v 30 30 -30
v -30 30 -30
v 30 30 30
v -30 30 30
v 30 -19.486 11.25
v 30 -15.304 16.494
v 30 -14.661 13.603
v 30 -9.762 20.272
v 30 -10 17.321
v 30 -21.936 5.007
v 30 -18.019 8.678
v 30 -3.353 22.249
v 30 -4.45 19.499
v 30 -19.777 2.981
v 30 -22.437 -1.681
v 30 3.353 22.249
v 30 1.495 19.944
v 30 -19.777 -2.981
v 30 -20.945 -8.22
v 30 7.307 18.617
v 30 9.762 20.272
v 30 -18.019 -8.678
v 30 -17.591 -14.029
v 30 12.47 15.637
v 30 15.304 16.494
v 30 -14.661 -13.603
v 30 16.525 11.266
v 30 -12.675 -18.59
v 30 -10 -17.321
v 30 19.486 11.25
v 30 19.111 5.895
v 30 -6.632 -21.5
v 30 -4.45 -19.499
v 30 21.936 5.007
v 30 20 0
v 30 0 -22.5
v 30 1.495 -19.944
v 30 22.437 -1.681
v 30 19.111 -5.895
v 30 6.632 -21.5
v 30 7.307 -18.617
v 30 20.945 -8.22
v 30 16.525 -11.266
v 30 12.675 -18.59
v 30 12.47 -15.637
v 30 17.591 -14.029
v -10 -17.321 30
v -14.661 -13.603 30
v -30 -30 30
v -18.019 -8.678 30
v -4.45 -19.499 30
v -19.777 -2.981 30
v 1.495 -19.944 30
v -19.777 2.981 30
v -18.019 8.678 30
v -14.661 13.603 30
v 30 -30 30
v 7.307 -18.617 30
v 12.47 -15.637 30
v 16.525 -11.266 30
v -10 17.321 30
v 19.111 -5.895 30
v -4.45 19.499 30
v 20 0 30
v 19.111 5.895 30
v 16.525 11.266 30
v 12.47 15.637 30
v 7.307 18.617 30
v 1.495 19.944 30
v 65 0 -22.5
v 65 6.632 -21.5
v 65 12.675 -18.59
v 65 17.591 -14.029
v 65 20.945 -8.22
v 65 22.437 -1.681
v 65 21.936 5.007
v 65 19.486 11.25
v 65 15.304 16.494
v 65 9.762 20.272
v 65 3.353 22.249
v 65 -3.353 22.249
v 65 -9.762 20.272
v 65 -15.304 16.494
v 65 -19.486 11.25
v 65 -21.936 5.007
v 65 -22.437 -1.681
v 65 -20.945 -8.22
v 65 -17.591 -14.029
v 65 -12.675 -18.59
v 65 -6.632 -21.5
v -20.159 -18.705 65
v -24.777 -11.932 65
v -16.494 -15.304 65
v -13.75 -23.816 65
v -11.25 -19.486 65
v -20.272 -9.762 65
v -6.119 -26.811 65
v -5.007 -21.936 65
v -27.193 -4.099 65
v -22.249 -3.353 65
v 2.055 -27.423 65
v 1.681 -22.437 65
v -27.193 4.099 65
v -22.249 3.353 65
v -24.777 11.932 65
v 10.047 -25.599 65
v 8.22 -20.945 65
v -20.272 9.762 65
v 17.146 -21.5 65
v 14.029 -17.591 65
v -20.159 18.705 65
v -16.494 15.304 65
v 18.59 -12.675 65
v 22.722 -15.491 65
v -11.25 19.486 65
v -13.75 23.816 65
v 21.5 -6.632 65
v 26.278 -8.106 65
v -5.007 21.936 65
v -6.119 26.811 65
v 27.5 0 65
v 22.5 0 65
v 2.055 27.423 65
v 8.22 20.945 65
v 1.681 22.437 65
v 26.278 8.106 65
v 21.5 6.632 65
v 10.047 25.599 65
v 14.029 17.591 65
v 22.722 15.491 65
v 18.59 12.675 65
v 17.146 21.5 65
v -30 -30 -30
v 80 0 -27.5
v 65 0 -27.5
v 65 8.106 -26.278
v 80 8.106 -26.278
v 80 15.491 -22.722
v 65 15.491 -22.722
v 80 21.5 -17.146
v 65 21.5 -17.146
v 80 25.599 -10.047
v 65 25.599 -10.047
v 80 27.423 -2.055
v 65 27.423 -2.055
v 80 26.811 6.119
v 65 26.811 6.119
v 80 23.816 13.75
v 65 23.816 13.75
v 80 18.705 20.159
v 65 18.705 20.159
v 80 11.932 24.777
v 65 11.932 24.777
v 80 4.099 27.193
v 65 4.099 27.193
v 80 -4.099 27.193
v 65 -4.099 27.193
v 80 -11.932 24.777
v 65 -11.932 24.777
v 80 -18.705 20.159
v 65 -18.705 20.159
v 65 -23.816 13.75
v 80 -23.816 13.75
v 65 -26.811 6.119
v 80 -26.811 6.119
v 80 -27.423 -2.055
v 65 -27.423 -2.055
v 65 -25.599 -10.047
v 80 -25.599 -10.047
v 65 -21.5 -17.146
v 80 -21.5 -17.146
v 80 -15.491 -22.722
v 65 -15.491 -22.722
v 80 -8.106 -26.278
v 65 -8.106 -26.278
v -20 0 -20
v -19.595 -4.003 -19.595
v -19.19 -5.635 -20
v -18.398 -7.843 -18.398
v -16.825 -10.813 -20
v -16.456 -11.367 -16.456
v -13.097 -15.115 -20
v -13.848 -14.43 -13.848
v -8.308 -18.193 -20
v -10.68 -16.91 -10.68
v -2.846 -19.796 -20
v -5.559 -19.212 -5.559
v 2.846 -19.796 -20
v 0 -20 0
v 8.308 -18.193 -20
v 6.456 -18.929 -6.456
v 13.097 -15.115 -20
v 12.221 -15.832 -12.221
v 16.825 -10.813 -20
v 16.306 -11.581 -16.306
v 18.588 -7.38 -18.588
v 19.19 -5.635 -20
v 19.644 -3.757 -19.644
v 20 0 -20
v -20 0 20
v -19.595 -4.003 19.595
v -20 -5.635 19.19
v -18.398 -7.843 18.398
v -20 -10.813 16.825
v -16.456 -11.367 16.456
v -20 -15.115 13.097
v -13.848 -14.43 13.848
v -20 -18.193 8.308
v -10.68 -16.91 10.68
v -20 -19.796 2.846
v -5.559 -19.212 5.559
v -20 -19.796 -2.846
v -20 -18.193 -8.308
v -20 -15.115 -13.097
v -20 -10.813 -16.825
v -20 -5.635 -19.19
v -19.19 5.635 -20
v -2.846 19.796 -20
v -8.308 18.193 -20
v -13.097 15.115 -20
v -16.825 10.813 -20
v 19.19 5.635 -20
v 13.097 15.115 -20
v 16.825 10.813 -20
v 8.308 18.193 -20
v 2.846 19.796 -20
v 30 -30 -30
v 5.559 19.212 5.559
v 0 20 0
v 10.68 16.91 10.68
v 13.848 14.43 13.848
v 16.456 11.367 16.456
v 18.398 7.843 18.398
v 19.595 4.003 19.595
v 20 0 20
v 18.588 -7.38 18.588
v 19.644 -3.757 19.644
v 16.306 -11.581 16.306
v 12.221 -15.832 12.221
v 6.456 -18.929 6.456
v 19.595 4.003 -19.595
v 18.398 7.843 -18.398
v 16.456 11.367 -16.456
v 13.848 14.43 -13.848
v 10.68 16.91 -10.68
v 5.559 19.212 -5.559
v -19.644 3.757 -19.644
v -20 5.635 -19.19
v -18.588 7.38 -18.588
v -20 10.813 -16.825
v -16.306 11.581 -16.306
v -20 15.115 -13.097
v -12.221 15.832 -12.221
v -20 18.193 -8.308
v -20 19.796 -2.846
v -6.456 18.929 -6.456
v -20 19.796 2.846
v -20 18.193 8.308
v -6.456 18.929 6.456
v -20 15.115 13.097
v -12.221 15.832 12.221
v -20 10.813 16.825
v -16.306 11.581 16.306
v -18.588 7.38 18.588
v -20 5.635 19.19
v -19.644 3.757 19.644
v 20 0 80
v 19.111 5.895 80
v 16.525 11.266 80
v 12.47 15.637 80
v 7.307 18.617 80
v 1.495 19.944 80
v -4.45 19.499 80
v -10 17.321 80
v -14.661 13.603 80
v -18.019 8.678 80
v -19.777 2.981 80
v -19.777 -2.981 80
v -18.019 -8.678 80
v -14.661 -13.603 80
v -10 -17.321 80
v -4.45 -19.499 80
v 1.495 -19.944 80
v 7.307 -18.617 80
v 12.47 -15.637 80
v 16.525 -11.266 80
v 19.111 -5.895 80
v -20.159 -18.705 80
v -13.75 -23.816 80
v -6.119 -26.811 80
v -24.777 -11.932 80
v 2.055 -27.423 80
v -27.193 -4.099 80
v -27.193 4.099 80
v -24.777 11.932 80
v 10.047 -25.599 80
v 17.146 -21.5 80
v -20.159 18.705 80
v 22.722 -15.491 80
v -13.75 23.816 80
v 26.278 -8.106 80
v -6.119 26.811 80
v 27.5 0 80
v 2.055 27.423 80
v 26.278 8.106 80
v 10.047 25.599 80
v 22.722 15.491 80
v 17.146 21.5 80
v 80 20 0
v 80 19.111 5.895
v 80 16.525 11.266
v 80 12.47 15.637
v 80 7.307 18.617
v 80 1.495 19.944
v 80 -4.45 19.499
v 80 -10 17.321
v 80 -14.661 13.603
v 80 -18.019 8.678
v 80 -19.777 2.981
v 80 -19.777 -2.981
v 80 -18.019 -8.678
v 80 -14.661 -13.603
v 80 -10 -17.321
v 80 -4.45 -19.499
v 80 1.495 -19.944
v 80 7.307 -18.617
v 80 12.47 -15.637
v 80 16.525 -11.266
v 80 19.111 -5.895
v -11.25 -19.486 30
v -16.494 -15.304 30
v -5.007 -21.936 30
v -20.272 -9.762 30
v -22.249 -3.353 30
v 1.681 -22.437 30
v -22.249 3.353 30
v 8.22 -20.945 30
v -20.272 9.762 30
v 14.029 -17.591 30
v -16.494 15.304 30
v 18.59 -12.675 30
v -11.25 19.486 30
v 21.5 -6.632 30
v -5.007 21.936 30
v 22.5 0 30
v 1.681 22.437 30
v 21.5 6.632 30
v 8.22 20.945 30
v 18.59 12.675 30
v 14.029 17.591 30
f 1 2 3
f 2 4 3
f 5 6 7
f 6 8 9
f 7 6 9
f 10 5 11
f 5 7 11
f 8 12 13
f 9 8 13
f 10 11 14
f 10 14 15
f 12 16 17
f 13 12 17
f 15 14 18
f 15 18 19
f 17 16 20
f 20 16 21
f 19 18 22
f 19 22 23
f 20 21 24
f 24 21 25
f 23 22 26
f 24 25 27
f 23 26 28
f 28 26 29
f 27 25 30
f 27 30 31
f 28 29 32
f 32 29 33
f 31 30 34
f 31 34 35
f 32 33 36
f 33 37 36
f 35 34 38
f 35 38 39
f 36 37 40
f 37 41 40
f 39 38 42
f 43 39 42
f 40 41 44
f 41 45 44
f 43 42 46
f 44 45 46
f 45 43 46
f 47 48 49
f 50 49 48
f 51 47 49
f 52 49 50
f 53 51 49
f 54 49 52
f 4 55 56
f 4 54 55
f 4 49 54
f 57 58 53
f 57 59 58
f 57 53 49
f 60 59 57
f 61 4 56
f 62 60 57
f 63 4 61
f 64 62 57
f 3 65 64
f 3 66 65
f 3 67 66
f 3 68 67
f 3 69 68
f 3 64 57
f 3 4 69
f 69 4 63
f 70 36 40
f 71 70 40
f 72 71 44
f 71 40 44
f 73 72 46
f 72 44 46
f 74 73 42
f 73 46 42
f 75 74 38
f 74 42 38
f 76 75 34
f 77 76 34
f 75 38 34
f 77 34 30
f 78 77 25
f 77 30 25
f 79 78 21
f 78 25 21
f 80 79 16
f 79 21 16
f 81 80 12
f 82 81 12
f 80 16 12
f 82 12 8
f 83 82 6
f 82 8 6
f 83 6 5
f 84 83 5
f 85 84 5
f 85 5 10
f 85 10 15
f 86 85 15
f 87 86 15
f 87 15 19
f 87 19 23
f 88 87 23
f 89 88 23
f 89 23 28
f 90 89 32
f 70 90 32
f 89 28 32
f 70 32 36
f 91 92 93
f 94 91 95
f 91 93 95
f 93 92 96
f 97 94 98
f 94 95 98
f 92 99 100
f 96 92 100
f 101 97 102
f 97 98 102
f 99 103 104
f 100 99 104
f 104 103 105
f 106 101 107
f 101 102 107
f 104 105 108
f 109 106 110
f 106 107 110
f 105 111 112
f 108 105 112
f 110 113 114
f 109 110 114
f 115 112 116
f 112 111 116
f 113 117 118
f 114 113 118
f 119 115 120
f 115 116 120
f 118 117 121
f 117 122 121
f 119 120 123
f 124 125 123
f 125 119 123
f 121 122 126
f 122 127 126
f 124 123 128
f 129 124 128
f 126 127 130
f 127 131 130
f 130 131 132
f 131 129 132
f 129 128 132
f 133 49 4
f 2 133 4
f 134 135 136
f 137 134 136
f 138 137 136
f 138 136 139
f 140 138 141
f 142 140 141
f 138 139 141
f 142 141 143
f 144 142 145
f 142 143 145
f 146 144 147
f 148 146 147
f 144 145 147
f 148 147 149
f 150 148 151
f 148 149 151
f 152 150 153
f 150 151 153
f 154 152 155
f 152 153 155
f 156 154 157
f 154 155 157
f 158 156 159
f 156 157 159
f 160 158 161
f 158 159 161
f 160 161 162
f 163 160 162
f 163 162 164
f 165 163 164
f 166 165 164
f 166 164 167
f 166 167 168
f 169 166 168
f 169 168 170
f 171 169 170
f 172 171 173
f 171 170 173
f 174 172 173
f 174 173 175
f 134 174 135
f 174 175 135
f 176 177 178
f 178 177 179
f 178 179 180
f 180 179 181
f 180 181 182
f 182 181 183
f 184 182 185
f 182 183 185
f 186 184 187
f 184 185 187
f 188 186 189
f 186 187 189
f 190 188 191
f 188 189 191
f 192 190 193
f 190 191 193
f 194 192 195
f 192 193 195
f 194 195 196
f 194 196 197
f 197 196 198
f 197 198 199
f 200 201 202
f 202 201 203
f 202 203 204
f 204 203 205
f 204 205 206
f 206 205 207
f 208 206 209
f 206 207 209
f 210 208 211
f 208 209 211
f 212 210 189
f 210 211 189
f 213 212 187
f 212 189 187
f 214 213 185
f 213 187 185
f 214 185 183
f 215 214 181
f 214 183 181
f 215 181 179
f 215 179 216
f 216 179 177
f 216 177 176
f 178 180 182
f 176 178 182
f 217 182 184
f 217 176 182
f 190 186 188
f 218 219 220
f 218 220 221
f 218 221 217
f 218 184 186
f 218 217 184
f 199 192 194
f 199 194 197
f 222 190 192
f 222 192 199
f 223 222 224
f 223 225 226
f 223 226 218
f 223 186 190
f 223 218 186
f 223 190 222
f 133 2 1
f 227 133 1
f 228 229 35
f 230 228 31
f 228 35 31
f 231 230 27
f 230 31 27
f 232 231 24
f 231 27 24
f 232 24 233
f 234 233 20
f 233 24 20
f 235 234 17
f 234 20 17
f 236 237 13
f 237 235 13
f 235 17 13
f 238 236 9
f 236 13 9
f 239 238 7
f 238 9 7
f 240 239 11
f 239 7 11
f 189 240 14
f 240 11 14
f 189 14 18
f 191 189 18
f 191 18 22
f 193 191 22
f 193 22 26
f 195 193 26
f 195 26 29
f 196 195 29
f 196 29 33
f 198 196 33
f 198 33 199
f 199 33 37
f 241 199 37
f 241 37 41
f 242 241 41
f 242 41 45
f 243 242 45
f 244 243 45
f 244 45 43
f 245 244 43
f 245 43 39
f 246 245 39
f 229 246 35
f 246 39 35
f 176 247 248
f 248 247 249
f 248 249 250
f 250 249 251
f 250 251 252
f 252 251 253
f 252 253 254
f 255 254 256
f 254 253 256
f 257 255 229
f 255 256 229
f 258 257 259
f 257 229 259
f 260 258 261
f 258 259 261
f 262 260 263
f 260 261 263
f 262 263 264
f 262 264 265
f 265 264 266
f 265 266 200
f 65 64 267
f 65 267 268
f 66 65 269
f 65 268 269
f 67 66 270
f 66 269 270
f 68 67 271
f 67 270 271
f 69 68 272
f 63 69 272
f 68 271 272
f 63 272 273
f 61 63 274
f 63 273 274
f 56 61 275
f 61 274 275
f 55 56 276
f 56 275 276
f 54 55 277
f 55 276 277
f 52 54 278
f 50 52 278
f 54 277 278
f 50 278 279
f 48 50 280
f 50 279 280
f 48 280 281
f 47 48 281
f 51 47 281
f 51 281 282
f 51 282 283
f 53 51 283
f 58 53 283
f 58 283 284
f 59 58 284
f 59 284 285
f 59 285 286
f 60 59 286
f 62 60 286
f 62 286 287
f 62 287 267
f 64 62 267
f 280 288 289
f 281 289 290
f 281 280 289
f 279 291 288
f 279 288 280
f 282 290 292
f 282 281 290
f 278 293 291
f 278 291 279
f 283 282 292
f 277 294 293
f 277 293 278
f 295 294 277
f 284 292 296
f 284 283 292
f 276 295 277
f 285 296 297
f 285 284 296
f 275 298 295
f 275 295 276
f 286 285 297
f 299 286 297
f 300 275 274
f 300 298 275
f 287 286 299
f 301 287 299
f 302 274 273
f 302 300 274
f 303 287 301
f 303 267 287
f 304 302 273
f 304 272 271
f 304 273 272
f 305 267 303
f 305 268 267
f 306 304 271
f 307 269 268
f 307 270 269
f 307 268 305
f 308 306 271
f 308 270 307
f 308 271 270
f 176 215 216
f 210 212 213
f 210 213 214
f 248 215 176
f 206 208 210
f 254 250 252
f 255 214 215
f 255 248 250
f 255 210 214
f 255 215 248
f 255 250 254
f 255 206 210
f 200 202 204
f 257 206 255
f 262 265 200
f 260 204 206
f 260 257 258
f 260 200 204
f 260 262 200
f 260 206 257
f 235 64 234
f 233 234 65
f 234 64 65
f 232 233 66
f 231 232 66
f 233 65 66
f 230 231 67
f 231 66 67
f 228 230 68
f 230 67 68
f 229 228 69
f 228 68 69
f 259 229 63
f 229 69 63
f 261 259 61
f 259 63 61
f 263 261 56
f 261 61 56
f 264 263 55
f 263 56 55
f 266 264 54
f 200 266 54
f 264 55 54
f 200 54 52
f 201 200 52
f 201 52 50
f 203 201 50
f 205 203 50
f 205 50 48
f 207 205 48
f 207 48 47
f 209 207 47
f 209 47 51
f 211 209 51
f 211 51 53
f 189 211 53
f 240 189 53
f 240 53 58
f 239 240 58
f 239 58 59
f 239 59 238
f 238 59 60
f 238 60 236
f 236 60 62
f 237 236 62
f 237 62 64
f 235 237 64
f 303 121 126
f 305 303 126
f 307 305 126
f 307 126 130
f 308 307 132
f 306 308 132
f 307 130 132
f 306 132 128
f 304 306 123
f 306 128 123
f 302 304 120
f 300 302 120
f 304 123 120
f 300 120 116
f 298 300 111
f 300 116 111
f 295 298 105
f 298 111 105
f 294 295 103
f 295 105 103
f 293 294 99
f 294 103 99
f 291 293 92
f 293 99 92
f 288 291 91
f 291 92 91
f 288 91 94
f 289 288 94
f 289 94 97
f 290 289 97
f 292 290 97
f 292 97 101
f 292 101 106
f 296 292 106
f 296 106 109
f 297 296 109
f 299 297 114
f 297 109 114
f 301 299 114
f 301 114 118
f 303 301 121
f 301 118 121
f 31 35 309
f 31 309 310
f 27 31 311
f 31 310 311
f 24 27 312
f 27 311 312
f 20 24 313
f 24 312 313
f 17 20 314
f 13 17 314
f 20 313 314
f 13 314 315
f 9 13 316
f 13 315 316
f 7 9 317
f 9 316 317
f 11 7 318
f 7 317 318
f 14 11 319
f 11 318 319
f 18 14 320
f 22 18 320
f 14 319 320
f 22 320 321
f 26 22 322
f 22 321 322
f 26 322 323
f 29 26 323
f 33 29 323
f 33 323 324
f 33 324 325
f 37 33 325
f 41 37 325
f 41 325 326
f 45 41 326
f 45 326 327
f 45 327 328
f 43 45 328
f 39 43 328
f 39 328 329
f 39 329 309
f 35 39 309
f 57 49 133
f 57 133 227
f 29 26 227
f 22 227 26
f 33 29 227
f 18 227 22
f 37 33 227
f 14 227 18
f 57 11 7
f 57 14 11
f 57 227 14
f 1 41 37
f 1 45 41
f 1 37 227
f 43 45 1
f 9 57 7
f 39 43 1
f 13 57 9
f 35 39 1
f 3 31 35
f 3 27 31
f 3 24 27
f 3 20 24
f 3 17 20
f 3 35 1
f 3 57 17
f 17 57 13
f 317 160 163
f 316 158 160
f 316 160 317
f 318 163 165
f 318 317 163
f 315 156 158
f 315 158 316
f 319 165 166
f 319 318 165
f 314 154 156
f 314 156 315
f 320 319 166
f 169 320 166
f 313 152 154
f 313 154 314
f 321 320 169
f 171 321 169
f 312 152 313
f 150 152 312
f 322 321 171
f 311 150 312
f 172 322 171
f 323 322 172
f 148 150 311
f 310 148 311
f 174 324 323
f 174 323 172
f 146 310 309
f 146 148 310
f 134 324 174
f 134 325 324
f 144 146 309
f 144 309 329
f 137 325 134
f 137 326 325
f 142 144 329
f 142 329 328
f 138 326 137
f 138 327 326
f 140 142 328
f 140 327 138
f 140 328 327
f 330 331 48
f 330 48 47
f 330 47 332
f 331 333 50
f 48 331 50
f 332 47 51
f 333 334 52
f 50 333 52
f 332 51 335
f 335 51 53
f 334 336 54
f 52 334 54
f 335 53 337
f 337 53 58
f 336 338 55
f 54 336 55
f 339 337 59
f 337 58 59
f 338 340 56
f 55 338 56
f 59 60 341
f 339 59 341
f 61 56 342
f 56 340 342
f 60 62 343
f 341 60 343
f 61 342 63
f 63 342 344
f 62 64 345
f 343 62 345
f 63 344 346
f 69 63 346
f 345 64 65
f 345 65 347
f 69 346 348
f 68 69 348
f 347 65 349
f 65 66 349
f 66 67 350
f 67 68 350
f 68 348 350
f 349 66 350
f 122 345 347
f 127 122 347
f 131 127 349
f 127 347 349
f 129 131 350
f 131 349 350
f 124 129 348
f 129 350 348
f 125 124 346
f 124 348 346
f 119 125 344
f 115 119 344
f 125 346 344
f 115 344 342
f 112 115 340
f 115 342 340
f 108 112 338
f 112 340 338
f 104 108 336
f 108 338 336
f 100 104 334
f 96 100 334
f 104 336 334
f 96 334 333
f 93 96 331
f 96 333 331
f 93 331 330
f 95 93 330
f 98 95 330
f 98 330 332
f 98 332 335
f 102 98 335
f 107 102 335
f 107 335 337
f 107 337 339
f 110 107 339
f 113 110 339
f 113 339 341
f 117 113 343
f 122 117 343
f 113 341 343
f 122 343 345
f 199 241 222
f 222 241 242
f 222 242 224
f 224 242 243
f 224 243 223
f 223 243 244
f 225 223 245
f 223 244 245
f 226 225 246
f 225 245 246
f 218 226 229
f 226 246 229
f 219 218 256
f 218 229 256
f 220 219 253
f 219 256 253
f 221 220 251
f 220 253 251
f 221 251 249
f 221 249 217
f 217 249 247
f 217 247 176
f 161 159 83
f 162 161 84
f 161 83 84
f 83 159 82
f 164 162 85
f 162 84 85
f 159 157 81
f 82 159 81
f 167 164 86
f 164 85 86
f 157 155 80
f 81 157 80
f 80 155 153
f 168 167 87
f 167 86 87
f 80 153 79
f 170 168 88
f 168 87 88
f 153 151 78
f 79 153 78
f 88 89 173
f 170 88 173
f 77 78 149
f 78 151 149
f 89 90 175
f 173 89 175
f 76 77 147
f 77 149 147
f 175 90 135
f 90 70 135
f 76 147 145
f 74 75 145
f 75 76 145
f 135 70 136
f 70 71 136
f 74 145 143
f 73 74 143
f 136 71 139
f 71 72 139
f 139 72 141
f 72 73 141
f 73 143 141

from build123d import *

# Parameters (mm, degrees)
F0_W      = 60
F0_H      = 60
F1_DEPTH  = 30
F2_R      = 22.5
F3_DEPTH  = 35
F4_R      = 27.5
F5_DEPTH  = 15
F8_COUNT  = 2
F8_ANGLE  = 90
F6_R      = 20
F9_DEPTH  = 100
F10_R     = 20
F11_DEPTH = 100


with BuildPart() as f1:
    # F0 (on Top) → F1 (new body, symmetric)
    with BuildSketch(Plane.XY):
        Rectangle(F0_W, F0_H)
    extrude(amount=F1_DEPTH, both=True)


with BuildPart() as f3:
    # F2 (on face) → F3 (new body)
    with BuildSketch(Plane.XY.offset(30)):
        Circle(F2_R)
    extrude(amount=F3_DEPTH)

    # F4 (on face) → F5 (join)
    with BuildSketch(Plane.XY.offset(65)):
        Circle(F4_R)
    extrude(amount=F5_DEPTH)


with BuildPart() as f8_1:
    # F8: instance of F3
    add(f3.part.rotate(Axis((0, 15, 0), (0, 1, 0)), 1 * F8_ANGLE / (F8_COUNT - 1)))


with BuildPart() as f9_tool:
    # F6 (on face) → F9 (new body)
    with BuildSketch(Plane.XY.offset(80)):
        Circle(F6_R)
    extrude(amount=-F9_DEPTH)


with BuildPart() as f1_1:
    add(f1.part)

    # F9: cut by f9_tool
    add(f9_tool.part, mode=Mode.SUBTRACT)


with BuildPart() as f3_1:
    add(f3.part)

    # F9: cut by f9_tool
    add(f9_tool.part, mode=Mode.SUBTRACT)


with BuildPart() as f11_tool:
    # F10 (on face) → F11 (new body)
    with BuildSketch(Plane.YZ.offset(80)):
        Circle(F10_R)
    extrude(amount=-F11_DEPTH)


with BuildPart() as f1_2:
    add(f1_1.part)

    # F11: cut by f11_tool
    add(f11_tool.part, mode=Mode.SUBTRACT)


with BuildPart() as f8_1_1:
    add(f8_1.part)

    # F11: cut by f11_tool
    add(f11_tool.part, mode=Mode.SUBTRACT)


solid = Compound([f3_1.part, f1_2.part, f8_1_1.part])
